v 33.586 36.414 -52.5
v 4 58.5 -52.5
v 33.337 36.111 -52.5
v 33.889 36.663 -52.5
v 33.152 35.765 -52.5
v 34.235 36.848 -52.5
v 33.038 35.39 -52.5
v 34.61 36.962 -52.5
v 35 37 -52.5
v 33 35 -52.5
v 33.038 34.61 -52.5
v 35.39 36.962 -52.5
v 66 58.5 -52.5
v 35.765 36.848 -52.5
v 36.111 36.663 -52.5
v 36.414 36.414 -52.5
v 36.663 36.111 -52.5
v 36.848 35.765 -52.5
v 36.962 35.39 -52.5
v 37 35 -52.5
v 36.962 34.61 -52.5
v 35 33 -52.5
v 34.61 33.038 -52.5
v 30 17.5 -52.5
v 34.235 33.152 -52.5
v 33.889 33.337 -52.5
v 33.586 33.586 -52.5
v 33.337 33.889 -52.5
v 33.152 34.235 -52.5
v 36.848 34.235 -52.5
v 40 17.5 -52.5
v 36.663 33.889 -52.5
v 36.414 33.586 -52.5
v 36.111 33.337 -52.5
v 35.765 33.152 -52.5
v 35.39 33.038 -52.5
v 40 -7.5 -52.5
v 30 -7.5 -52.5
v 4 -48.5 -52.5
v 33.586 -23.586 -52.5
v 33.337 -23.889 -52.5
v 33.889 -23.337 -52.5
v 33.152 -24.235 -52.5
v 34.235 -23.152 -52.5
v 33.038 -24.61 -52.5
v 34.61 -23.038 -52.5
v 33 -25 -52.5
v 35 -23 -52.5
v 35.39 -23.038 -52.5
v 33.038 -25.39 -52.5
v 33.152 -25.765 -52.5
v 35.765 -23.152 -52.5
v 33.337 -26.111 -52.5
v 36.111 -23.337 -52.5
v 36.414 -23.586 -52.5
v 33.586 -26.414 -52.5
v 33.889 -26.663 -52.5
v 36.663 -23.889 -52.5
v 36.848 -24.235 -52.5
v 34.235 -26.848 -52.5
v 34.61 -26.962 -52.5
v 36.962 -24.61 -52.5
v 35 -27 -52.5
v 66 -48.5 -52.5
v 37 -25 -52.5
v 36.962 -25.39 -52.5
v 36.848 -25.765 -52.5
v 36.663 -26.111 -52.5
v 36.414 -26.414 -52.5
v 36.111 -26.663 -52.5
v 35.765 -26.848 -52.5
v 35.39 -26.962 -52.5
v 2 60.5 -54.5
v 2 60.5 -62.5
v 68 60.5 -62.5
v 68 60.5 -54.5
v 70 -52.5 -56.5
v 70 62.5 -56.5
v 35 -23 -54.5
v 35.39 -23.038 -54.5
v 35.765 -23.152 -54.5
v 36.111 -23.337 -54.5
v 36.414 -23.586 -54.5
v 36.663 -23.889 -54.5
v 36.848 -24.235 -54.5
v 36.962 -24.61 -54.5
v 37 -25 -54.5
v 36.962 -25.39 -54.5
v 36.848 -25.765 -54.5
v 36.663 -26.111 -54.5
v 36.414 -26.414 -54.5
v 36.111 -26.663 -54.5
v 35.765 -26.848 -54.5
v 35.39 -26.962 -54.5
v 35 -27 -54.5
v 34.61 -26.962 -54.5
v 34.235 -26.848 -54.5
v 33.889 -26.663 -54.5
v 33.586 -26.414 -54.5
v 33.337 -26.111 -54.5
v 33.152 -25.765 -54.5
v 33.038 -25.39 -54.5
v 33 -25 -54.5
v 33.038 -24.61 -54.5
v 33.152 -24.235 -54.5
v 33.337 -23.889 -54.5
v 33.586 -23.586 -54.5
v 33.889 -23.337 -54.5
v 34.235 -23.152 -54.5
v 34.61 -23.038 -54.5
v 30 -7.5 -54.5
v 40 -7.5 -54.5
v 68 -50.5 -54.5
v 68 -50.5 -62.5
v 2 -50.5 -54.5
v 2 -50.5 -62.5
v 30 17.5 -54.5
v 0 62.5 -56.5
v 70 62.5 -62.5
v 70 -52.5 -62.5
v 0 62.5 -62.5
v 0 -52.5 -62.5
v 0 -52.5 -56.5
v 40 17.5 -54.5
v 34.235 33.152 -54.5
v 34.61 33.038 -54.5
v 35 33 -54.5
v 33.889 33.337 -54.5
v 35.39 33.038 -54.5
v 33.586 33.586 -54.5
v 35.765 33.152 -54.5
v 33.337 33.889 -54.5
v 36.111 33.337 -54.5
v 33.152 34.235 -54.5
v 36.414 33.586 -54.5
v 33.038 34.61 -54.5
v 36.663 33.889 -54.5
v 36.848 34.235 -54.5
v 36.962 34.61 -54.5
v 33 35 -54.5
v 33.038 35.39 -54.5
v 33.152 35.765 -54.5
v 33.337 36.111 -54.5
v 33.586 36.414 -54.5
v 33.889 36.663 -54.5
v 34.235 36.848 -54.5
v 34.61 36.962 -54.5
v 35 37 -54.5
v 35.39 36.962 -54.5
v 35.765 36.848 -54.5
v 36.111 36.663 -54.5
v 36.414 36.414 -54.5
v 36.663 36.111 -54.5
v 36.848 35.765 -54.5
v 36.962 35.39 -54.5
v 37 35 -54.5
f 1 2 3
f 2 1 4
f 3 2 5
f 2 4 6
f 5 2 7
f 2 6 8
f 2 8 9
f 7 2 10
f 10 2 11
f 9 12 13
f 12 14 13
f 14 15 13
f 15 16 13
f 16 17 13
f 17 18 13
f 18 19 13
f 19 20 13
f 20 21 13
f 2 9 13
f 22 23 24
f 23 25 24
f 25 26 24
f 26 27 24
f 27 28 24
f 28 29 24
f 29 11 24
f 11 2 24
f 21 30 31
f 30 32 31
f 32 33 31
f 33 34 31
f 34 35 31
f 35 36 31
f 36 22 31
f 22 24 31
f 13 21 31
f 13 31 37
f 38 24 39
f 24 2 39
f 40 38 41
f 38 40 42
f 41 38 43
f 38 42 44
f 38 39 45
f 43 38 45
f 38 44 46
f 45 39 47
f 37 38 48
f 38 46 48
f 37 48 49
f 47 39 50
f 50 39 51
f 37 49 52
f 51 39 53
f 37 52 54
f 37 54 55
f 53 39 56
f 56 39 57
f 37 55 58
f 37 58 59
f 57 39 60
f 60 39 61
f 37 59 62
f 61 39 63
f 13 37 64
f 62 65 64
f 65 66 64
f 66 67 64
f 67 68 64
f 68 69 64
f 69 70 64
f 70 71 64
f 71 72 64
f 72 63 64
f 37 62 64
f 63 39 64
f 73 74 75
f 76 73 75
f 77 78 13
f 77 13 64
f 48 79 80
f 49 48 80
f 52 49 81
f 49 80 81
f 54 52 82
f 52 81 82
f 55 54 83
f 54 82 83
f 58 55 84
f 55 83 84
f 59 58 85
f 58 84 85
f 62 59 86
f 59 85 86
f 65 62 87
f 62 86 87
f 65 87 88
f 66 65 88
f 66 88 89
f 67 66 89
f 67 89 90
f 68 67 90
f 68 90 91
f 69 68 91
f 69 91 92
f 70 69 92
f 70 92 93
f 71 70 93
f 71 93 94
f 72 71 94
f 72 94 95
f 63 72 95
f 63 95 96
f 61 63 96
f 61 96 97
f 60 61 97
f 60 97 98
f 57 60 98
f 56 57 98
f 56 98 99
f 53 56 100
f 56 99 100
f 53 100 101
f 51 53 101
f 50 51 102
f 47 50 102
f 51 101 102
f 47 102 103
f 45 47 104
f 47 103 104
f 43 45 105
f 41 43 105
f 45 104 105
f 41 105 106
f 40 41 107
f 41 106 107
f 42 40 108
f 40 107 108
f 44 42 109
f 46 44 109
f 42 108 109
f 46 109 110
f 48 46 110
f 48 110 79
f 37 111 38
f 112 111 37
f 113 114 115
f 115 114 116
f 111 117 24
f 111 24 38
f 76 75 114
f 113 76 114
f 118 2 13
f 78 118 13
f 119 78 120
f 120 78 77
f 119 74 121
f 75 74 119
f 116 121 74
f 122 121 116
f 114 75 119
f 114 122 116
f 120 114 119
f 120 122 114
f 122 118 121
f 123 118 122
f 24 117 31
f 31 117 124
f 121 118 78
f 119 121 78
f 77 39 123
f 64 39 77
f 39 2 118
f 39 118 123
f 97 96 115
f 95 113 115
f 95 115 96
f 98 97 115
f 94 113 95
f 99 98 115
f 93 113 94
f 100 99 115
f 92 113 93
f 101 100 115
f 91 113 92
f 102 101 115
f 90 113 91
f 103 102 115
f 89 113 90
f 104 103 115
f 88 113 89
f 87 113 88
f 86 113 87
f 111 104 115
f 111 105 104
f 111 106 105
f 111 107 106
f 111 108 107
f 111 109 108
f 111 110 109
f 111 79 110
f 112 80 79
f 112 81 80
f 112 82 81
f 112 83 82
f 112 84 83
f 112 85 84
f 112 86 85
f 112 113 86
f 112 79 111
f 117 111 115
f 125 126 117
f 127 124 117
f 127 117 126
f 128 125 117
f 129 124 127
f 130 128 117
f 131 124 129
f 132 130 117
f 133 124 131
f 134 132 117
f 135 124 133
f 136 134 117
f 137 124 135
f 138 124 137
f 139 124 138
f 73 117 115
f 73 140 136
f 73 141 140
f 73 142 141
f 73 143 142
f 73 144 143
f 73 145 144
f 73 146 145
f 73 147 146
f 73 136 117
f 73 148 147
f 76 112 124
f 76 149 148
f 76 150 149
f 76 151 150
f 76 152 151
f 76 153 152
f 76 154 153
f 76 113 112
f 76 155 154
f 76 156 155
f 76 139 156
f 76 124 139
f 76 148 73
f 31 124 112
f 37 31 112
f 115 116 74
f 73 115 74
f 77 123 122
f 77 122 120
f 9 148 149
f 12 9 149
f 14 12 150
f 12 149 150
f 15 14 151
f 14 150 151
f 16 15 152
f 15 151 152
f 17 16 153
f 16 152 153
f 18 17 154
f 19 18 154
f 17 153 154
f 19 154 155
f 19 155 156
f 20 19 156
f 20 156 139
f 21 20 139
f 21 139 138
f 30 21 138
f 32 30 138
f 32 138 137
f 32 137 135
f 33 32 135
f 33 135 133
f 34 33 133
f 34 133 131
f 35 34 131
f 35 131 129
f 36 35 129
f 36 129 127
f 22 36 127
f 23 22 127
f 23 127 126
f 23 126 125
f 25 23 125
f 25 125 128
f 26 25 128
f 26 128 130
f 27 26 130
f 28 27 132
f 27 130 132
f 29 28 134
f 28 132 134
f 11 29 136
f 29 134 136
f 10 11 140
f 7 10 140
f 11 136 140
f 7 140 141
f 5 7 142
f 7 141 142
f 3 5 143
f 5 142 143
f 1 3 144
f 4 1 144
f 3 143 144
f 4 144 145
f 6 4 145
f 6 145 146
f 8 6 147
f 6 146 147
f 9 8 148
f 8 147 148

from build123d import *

# Parameters (mm, degrees)
SKETCH1_W             = 70
SKETCH1_H             = 115
BOSS_EXTRUDE1_DEPTH   = 10
CUT_EXTRUDE1_DEPTH    = 8
CHAMFER1_SIZE         = 4
SKETCH2_R             = 2
SKETCH2_W             = 10
SKETCH2_H             = 25
CUT_EXTRUDE2_DEPTH    = 8
BODY_MOVE_COPY1_ANGLE = 90


with BuildPart() as part:
    # Sketch1 → Boss-Extrude1 (new body)
    with BuildSketch(Plane(origin=(0, 0, 0), x_dir=(1, 0, 0), z_dir=(0, 1, 0))):
        with Locations((35, 57.5)):
            Rectangle(SKETCH1_W, SKETCH1_H)
    extrude(amount=BOSS_EXTRUDE1_DEPTH)

    # 3DSketch1 → Cut-Extrude1 (cut)
    with BuildSketch(Plane(origin=(2, 10, -2), x_dir=(0.51107539287715, 0, -0.8595358880206614), z_dir=(0, -1, 0))):
        Polygon((0, 0), (33.73097593, 56.729368609), (129.1394595, 0), (95.40848357, -56.729368609), align=None)
    extrude(amount=CUT_EXTRUDE1_DEPTH, mode=Mode.SUBTRACT)

    # Chamfer1
    chamfer1_edges = [part.edges().sort_by_distance(p)[0] for p in [
        (35, 0, -115),
        (70, 0, -57.5),
        (35, 0, 0),
        (0, 0, -57.5),
    ]]
    chamfer(chamfer1_edges, length=CHAMFER1_SIZE)

    # Sketch2 → Cut-Extrude2 (cut)
    with BuildSketch(Plane(origin=(0, 2, 0), x_dir=(1, 0, 0), z_dir=(0, 1, 0))):
        with Locations(Location((35, 87.5, 0), (0, 0, 270))):
            Circle(SKETCH2_R)
        with Locations(Location((35, 27.5, 0), (0, 0, 270))):
            Circle(SKETCH2_R)
        with Locations((35, 57.5)):
            Rectangle(SKETCH2_W, SKETCH2_H)
    extrude(amount=-CUT_EXTRUDE2_DEPTH, mode=Mode.SUBTRACT)


with BuildPart() as part_1:
    # Body-Move/Copy1: moved
    add(part.part.rotate(Axis((0, 5.000051539, -57.5), (-1, 0, 0)), BODY_MOVE_COPY1_ANGLE))


solid = part_1.part
